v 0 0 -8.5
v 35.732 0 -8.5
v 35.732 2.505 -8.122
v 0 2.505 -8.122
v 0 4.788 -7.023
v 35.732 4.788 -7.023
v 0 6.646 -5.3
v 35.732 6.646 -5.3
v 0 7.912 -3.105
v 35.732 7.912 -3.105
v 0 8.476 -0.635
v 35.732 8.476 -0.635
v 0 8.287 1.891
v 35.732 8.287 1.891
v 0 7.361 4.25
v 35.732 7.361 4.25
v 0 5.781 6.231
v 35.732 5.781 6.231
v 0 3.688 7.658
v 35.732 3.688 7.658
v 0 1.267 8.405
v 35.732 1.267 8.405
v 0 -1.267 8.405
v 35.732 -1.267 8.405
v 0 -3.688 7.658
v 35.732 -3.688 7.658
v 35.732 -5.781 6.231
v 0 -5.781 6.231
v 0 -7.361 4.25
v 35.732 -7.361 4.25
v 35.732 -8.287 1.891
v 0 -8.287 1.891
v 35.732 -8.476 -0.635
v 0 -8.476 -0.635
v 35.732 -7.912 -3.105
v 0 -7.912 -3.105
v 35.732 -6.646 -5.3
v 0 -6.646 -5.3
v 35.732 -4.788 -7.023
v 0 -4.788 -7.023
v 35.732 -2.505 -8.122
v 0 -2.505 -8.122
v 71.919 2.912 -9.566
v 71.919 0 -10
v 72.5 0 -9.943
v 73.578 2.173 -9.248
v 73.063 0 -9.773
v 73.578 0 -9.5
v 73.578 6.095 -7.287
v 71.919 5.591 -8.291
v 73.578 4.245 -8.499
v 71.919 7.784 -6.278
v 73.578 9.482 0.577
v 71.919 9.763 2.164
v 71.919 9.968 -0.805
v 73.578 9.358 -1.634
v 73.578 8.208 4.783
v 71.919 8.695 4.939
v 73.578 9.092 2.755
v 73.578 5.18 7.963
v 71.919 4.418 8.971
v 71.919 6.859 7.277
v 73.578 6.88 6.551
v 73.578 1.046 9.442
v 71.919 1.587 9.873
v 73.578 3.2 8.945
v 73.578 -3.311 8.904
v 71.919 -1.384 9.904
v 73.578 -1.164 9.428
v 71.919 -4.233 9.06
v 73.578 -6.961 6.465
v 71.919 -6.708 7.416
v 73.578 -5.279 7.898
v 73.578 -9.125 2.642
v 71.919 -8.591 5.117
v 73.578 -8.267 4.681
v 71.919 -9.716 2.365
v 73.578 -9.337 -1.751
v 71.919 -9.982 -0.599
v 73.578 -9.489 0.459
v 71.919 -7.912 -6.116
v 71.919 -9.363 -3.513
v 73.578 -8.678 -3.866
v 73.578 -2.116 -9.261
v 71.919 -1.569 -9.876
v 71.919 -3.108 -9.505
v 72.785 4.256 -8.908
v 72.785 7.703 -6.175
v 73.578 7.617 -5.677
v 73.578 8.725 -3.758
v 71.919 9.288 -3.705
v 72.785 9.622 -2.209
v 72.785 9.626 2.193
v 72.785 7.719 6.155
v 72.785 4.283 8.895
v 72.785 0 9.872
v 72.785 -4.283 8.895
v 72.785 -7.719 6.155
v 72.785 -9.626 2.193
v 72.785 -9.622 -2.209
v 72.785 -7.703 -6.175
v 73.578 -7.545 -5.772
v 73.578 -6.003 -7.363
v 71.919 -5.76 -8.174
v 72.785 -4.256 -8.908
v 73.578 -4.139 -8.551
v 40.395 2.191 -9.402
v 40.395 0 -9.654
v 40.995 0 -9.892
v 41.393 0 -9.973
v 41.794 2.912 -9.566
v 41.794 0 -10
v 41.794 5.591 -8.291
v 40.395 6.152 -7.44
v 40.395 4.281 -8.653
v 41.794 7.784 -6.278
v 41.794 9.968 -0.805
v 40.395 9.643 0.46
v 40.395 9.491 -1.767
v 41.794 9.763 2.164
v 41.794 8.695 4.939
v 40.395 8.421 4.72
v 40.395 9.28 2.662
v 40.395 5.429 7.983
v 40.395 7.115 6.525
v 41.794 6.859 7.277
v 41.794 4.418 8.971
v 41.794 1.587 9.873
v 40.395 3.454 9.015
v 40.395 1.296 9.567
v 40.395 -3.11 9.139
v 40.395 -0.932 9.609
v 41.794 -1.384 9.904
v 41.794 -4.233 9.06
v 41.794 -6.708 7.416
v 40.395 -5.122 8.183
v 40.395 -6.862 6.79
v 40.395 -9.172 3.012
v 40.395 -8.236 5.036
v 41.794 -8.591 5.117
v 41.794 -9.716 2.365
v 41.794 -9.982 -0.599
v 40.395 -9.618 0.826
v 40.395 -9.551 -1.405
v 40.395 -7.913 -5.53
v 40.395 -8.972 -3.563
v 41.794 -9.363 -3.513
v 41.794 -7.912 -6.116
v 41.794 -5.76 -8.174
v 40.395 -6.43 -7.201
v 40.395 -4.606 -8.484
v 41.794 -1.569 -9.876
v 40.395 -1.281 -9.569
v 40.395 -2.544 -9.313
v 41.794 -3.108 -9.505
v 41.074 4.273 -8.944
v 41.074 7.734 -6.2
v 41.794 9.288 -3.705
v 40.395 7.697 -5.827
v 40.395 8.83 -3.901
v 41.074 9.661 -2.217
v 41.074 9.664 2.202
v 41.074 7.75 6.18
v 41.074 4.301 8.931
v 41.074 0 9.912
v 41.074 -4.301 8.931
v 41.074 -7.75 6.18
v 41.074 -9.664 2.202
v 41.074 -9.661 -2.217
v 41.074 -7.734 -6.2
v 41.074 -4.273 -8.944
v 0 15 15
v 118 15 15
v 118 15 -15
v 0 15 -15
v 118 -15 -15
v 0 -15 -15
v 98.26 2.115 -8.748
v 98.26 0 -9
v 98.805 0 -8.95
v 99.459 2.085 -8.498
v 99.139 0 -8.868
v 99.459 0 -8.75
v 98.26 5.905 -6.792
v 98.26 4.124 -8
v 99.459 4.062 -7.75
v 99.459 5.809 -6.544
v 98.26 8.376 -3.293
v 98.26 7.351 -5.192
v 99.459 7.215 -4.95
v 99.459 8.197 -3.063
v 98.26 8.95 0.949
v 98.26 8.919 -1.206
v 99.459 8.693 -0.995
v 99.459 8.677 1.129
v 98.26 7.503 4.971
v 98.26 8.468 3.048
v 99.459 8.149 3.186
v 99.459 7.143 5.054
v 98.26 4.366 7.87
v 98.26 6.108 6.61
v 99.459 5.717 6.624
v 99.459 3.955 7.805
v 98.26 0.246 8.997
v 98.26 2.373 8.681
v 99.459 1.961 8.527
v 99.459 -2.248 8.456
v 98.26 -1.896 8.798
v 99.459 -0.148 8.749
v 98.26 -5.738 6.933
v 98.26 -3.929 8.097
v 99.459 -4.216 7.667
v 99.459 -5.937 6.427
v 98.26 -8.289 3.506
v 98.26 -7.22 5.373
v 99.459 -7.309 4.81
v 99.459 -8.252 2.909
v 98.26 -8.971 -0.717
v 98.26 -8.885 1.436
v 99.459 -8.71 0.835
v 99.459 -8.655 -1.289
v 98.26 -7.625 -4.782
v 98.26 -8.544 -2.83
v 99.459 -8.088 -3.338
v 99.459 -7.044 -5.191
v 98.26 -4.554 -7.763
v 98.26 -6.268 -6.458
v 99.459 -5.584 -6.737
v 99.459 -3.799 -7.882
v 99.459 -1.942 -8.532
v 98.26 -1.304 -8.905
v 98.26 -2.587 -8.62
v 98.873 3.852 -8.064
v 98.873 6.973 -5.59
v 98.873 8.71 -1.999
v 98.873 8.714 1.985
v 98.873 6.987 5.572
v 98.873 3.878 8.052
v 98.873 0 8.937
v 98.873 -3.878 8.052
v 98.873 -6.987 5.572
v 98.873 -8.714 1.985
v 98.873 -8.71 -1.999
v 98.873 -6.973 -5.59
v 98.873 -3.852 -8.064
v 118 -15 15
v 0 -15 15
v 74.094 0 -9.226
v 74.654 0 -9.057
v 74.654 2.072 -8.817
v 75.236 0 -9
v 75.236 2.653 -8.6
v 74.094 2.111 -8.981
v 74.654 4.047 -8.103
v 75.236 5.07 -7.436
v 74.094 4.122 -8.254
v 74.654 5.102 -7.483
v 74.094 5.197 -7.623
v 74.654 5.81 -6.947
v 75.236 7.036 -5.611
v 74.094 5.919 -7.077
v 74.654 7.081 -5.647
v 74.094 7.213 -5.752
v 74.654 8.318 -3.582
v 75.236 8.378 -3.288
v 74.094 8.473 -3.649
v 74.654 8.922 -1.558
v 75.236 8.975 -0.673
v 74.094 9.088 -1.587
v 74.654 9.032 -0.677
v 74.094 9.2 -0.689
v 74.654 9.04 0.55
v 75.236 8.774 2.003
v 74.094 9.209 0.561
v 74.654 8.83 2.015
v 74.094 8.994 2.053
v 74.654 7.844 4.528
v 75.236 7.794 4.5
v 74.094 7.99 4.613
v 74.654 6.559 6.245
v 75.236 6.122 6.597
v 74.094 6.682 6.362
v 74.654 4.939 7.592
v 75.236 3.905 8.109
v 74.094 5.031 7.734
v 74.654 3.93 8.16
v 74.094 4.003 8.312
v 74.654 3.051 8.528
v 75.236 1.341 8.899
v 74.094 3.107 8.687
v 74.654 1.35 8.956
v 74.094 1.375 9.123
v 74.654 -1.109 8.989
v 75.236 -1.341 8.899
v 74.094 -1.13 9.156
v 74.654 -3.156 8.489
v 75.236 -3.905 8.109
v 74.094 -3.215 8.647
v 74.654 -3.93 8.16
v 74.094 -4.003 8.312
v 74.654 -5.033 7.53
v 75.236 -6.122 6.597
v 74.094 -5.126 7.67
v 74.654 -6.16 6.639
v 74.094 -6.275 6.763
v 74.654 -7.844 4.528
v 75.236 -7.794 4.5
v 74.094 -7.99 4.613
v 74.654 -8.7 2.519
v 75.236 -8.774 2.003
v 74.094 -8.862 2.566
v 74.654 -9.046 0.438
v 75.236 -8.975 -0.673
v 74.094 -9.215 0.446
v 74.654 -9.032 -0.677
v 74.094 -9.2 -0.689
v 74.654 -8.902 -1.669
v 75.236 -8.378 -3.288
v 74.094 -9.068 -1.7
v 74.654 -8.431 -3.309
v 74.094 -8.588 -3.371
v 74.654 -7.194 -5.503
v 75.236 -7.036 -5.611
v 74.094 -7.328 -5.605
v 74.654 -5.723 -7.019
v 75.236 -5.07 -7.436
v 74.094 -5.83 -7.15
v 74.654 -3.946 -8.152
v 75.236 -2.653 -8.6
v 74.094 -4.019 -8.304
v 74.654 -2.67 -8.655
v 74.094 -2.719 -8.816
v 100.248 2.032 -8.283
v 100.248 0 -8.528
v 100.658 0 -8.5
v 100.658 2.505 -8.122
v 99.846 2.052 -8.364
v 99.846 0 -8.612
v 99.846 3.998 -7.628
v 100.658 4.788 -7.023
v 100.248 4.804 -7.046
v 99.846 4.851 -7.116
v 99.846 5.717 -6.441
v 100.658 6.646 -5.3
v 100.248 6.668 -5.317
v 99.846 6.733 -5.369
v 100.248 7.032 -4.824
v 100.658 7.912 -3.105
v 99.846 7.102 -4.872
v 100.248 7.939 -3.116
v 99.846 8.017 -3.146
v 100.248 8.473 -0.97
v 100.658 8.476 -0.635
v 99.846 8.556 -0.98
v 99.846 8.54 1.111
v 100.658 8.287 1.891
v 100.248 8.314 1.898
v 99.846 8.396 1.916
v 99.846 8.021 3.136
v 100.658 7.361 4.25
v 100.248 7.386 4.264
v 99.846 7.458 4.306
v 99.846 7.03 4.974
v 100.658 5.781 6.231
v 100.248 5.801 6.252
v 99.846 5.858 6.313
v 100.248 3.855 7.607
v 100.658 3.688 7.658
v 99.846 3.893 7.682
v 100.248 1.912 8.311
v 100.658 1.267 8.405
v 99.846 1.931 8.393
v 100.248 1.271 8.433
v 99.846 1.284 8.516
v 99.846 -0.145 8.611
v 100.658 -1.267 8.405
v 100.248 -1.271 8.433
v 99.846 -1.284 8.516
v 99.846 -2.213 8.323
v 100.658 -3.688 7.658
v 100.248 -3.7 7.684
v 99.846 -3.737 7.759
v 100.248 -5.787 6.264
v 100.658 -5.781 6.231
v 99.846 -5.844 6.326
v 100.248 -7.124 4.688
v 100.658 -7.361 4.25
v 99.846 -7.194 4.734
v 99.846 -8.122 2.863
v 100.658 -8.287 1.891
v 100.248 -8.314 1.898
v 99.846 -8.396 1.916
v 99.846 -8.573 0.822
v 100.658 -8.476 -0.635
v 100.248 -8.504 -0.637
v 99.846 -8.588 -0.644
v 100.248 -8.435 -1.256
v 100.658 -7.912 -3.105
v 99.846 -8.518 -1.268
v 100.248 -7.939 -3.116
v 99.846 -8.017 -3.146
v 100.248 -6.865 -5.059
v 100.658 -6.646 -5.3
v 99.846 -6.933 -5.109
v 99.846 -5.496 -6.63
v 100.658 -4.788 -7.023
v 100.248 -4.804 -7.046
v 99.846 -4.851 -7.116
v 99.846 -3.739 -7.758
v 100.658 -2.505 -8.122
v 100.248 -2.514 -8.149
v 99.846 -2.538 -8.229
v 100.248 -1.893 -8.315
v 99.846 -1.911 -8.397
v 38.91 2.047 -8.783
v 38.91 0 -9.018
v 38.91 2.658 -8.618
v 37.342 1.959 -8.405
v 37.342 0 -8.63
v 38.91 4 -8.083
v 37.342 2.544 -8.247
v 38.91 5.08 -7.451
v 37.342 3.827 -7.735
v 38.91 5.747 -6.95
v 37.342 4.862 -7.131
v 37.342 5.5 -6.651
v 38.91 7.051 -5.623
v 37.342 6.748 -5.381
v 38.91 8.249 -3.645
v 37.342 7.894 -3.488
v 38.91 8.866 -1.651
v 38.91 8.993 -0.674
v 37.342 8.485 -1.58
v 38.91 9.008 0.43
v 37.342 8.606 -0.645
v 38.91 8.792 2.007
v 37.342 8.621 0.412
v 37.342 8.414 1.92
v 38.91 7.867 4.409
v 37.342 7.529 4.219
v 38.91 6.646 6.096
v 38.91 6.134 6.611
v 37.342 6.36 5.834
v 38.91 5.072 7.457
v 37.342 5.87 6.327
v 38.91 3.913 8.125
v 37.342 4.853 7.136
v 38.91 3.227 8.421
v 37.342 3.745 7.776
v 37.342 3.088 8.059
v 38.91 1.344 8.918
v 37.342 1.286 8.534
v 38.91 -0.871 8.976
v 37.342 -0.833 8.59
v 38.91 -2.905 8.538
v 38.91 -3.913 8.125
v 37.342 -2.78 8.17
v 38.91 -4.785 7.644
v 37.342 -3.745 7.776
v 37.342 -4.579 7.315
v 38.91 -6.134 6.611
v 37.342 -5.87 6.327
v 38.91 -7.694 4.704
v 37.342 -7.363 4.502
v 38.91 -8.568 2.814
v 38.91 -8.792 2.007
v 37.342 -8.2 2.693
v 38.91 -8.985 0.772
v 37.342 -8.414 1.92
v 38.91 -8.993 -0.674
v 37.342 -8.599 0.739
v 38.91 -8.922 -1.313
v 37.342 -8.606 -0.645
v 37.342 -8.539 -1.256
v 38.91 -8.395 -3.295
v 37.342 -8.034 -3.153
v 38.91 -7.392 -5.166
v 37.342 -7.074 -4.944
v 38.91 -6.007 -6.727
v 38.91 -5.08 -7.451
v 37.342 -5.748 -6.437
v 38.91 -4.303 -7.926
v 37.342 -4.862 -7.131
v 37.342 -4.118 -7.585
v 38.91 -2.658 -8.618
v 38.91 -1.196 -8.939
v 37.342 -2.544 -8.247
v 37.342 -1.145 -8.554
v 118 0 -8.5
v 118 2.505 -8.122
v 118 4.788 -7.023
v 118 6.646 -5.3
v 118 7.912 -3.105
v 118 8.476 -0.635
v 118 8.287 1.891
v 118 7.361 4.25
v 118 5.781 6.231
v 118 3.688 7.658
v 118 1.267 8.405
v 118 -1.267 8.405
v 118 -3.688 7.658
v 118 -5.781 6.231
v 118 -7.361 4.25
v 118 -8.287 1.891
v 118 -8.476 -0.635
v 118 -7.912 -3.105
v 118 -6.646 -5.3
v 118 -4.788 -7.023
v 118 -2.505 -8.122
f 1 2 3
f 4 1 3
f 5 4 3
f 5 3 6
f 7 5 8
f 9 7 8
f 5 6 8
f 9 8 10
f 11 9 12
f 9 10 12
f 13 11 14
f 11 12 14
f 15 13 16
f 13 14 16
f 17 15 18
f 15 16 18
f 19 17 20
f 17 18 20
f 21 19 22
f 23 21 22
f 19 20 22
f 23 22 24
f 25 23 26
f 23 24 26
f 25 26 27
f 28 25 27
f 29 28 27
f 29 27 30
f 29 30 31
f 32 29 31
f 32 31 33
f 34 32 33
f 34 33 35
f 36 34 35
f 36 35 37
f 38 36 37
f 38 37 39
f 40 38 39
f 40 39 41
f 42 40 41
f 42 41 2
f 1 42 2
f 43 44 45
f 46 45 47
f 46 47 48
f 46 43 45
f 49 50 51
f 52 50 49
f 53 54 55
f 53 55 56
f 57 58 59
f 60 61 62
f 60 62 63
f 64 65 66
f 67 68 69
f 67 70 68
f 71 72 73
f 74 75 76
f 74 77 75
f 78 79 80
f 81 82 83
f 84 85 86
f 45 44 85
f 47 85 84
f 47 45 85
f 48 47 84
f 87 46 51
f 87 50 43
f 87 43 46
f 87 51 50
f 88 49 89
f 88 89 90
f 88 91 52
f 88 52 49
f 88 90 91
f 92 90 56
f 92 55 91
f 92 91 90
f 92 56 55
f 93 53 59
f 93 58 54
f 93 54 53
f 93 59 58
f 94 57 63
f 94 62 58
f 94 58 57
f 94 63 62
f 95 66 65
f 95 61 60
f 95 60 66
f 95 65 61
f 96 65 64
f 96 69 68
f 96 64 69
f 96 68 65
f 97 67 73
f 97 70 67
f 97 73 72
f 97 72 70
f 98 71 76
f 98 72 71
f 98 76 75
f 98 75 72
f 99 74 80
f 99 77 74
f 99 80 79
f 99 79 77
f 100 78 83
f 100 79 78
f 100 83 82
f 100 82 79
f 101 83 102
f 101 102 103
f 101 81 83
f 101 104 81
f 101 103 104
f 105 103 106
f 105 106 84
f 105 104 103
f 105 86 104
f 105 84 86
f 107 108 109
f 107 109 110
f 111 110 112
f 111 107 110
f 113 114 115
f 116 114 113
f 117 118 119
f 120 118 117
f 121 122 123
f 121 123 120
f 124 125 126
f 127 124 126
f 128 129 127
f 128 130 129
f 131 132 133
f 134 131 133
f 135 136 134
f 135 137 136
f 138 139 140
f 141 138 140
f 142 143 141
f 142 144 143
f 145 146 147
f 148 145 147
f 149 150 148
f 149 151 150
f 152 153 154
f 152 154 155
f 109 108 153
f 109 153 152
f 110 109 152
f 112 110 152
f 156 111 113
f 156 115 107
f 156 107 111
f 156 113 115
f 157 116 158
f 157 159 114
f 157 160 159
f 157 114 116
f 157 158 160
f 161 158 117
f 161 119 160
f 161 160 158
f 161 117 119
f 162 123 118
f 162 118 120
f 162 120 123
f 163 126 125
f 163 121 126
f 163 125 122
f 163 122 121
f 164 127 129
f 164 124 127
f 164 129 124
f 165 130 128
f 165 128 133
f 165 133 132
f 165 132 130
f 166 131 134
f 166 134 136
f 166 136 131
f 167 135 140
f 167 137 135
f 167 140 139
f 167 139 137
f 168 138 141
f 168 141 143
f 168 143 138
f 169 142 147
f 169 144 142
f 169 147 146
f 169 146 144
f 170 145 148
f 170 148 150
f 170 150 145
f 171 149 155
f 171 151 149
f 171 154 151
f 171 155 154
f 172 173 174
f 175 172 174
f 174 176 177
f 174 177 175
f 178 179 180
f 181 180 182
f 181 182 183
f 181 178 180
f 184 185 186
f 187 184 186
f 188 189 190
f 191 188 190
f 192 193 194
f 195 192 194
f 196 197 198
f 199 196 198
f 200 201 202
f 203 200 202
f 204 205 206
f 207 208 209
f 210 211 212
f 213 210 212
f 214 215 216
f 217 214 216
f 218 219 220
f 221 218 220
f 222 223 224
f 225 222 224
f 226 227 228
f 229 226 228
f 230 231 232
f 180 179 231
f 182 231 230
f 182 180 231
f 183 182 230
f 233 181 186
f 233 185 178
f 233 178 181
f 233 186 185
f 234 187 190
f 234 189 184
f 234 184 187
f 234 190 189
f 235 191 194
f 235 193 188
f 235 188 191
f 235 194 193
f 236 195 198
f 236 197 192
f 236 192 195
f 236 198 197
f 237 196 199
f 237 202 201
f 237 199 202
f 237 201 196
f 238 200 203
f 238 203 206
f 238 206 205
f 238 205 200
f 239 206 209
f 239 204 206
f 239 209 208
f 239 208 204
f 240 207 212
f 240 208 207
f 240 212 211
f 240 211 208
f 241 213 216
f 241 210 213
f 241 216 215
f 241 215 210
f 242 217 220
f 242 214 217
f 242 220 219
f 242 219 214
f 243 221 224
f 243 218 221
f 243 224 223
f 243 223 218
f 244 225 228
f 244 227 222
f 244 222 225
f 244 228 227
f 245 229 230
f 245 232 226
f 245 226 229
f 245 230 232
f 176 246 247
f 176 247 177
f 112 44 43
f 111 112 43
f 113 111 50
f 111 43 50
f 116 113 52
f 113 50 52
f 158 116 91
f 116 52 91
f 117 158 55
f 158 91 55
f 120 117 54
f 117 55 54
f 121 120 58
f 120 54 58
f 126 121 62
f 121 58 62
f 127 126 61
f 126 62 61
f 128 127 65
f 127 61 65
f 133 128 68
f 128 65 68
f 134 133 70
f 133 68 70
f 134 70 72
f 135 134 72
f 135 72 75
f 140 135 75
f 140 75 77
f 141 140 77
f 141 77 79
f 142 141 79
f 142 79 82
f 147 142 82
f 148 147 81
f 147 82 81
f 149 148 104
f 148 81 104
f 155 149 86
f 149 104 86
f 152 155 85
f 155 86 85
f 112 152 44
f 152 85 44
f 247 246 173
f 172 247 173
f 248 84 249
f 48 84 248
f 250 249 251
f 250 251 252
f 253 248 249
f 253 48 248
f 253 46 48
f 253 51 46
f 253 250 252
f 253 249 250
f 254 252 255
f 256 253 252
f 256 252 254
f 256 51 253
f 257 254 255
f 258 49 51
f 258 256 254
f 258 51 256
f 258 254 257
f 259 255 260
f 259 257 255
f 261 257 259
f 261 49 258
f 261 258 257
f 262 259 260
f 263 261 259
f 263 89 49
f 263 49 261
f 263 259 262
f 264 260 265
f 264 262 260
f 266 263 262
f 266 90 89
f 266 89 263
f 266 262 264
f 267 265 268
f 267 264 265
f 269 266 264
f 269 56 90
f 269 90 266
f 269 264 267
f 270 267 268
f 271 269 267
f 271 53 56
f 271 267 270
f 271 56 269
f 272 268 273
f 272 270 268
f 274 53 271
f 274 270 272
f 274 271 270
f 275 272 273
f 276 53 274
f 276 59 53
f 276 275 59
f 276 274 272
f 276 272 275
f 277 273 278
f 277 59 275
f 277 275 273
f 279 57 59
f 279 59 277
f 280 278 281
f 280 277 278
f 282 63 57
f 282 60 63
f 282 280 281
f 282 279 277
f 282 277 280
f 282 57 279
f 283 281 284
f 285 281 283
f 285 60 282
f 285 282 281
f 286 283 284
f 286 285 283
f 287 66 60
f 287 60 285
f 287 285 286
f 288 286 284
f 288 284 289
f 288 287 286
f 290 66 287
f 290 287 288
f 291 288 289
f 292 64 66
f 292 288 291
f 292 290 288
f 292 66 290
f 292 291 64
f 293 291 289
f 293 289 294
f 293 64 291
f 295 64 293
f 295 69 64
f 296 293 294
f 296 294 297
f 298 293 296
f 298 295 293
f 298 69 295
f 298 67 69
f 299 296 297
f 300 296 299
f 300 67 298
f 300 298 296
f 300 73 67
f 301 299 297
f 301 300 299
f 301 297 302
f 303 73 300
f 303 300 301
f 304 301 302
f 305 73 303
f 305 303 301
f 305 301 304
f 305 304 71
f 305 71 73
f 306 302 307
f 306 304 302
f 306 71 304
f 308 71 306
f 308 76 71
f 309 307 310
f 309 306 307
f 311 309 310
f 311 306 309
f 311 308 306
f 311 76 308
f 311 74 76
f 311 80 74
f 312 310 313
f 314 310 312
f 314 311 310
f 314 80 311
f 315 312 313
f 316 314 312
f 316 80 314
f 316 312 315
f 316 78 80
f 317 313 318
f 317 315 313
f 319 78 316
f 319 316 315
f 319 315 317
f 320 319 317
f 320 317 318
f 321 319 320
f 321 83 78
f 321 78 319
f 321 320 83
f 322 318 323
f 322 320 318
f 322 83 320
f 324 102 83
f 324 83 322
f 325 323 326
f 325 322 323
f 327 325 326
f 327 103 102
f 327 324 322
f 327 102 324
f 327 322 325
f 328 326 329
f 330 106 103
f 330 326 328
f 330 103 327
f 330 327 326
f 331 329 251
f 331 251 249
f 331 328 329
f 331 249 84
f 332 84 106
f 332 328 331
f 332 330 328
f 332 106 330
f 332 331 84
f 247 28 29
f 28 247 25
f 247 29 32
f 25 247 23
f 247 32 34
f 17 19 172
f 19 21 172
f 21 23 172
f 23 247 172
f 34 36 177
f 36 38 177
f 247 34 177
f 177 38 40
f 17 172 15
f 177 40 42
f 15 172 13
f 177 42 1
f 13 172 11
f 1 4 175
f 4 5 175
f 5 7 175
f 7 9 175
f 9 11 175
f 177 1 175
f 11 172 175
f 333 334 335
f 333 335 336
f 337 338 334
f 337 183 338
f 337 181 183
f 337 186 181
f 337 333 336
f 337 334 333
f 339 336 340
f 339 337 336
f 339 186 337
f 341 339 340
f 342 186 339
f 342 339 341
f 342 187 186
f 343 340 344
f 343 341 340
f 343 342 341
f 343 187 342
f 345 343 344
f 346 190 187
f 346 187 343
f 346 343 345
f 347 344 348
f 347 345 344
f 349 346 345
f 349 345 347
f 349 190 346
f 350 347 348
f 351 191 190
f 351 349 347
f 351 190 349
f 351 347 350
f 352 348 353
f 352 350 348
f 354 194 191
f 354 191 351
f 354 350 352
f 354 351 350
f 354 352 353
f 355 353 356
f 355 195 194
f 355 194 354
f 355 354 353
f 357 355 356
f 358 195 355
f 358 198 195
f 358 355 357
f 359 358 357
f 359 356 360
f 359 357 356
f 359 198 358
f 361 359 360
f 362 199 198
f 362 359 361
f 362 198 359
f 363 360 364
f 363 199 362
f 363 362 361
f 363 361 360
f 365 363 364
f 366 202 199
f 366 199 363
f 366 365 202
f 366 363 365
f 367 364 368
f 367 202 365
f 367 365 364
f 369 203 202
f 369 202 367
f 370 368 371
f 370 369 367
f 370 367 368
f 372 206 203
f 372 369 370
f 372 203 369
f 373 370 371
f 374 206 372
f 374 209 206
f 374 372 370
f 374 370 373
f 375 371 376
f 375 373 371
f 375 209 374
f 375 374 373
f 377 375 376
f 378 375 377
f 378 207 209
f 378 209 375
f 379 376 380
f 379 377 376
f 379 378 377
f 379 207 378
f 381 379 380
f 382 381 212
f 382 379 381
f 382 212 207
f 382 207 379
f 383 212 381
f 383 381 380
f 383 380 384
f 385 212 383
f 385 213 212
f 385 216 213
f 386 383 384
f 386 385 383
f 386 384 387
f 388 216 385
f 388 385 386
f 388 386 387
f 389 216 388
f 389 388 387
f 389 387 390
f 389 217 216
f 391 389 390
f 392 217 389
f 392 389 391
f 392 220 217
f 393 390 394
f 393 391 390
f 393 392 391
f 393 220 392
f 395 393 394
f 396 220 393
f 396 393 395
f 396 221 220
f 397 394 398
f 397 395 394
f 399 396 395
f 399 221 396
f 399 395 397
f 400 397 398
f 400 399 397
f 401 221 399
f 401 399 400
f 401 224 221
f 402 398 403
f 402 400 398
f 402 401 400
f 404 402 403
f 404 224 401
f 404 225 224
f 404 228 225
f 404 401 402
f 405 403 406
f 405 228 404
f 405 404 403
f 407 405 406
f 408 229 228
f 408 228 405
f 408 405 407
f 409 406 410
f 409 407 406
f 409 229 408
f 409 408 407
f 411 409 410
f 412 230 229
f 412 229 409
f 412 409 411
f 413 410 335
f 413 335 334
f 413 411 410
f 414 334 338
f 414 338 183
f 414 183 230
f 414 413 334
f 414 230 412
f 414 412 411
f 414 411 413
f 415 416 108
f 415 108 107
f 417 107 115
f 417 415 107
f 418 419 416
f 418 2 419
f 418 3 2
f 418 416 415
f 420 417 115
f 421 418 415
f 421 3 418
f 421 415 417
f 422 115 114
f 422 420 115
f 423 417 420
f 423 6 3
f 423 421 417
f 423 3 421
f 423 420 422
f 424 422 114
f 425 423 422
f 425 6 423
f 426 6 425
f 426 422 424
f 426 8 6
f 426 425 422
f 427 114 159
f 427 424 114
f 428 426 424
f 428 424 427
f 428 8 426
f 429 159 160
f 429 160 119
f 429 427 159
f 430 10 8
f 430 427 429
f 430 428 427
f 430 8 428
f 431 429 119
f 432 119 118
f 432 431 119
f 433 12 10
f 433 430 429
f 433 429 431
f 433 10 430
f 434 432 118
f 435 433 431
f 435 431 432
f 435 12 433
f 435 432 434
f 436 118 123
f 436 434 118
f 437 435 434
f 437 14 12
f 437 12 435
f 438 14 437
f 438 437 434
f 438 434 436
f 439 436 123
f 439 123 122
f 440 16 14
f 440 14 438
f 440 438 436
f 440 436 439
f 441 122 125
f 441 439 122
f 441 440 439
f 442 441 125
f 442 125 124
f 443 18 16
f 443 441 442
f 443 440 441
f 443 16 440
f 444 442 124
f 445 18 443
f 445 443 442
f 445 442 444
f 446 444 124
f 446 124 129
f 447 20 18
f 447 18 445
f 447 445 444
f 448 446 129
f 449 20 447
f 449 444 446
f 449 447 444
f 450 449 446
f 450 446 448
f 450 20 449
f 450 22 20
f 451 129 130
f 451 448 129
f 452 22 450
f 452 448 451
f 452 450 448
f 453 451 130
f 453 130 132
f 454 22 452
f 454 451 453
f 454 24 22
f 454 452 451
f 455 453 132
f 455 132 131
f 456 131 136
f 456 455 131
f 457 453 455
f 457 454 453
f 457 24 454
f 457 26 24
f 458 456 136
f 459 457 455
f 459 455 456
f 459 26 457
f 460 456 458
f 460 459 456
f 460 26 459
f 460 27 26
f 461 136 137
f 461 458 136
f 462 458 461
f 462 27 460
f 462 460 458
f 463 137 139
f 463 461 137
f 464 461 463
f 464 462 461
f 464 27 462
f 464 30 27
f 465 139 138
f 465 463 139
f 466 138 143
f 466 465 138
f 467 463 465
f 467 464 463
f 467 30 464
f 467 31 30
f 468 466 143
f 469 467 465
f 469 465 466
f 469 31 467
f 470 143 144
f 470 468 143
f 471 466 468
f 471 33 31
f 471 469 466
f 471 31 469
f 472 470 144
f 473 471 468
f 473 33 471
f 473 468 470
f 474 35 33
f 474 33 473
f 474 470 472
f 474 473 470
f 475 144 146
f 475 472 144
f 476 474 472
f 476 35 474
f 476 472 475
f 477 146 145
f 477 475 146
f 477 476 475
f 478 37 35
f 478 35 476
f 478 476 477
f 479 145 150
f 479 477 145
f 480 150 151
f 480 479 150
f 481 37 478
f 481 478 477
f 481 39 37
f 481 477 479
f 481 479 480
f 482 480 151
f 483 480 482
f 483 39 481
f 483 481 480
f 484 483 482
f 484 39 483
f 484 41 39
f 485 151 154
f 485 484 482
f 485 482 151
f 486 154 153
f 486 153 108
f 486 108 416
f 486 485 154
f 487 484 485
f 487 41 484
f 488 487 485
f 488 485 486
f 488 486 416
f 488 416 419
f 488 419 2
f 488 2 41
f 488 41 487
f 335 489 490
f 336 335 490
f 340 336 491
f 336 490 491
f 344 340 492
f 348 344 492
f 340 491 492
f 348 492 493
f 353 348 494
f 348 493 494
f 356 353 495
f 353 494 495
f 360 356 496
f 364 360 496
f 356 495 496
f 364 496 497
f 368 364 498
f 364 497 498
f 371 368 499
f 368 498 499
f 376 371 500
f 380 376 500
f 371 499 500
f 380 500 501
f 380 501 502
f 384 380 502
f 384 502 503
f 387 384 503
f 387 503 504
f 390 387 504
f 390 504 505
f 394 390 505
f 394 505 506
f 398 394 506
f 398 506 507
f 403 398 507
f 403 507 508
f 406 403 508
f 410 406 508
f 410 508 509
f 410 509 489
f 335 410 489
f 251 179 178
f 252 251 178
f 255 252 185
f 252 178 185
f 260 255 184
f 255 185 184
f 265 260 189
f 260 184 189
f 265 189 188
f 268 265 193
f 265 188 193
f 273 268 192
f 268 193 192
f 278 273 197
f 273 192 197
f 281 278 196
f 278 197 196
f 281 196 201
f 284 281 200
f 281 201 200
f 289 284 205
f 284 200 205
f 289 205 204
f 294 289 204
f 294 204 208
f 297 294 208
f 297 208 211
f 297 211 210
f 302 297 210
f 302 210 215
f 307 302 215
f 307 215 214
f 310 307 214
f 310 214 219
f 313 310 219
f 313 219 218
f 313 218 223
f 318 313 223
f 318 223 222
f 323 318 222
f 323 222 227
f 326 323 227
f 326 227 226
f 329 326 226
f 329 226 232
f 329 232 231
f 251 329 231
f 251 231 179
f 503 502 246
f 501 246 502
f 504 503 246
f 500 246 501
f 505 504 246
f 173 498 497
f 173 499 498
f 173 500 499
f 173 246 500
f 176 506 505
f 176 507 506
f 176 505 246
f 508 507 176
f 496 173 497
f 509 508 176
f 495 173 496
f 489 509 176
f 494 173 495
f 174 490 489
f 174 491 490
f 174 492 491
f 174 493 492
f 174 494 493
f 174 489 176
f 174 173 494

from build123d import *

# Parameters (mm, degrees)
SKETCH1_W           = 30
SKETCH1_H           = 30
BOSS_EXTRUDE1_DEPTH = 118
SKETCH2_R           = 8.5
CUT_EXTRUDE1_DEPTH  = 19
SKETCH3_R           = 9
CUT_EXTRUDE2_DEPTH  = 26
SKETCH4_R           = 10
CUT_EXTRUDE3_DEPTH  = 32
SKETCH5_R           = 8.5
CUT_EXTRUDE4_DEPTH  = 44
FILLET3_R           = 10
FILLET4_R           = 3
FILLET5_R           = 3
FILLET6_R           = 3
FILLET7_R           = 3
FILLET8_R           = 3


with BuildPart() as part:
    # Sketch1 → Boss-Extrude1 (new body)
    with BuildSketch(Plane(origin=(0, 0, 0), x_dir=(0, 0, -1), z_dir=(1, 0, 0))):
        Rectangle(SKETCH1_W, SKETCH1_H)
    extrude(amount=BOSS_EXTRUDE1_DEPTH)

    # Sketch2 → Cut-Extrude1 (cut)
    with BuildSketch(Plane(origin=(118, 0, 0), x_dir=(0, 0, -1), z_dir=(1, 0, 0))):
        Circle(SKETCH2_R)
    extrude(amount=-CUT_EXTRUDE1_DEPTH, mode=Mode.SUBTRACT)

    # Sketch3 → Cut-Extrude2 (cut)
    with BuildSketch(Plane(origin=(99, 0, 0), x_dir=(0, 0, -1), z_dir=(1, 0, 0))):
        Circle(SKETCH3_R)
    extrude(amount=-CUT_EXTRUDE2_DEPTH, mode=Mode.SUBTRACT)

    # Sketch4 → Cut-Extrude3 (cut)
    with BuildSketch(Plane(origin=(73, 0, 0), x_dir=(0, 0, -1), z_dir=(1, 0, 0))):
        Circle(SKETCH4_R)
    extrude(amount=-CUT_EXTRUDE3_DEPTH, mode=Mode.SUBTRACT)

    # Sketch5 → Cut-Extrude4 (cut)
    with BuildSketch(Plane(origin=(41, 0, 0), x_dir=(0, 0, -1), z_dir=(1, 0, 0))):
        Circle(SKETCH5_R)
    extrude(amount=-CUT_EXTRUDE4_DEPTH, mode=Mode.SUBTRACT)

    # Fillet3
    # the kernel refuses this fillet: 10 mm, written as the material it takes off along each edge
    with BuildSketch(Plane(origin=(41, 0, 0), x_dir=(0, 0, -1), z_dir=(0, -1, 0))) as fillet3_piece_1:
        with BuildLine():
            CenterArc((18.5, -5.267826876), FILLET3_R, 148.211669383, 31.788330617)
            Line((10, 0), (9.83, 0.105356538))
            ThreePointArc((9.83, 0.105356538), (9.25, 0.2), (8.5, 0.2))
            Line((8.5, 0.2), (8.3, 0))
            Line((8.3, 0), (8.3, -5.267826876))
            Line((8.3, -5.267826876), (8.5, -5.267826876))
        make_face()
    revolve(axis=Axis((41, 0, 0), (1, 0, 0)), mode=Mode.SUBTRACT)

    # Fillet4
    fillet4_edges = [part.edges().sort_by_distance(p)[0] for p in [
        (41, 0, 10),
    ]]
    fillet(fillet4_edges, radius=FILLET4_R)

    # Fillet5
    # the kernel refuses this fillet: 3 mm, written as the material it takes off along each edge
    with BuildSketch(Plane(origin=(73, 0, 0), x_dir=(0, 0, -1), z_dir=(0, -1, 0))) as fillet5_piece_1:
        with BuildLine():
            CenterArc((12, 2.236067977), FILLET5_R, 180, 48.189685104)
            Line((9, 2.236067977), (8.94, 2.236067977))
            Line((8.94, 2.236067977), (8.94, 0))
            Line((8.94, 0), (9, -0.06))
            ThreePointArc((9, -0.06), (9.5, -0.06), (9.96, -0.04472136))
            Line((9.96, -0.04472136), (10, 0))
        make_face()
    revolve(axis=Axis((73, 0, 0), (1, 0, 0)), mode=Mode.SUBTRACT)

    # Fillet6
    fillet6_edges = [part.edges().sort_by_distance(p)[0] for p in [
        (73, 0, 10),
    ]]
    fillet(fillet6_edges, radius=FILLET6_R)

    # Fillet7
    # the kernel refuses this fillet: 3 mm, written as the material it takes off along each edge
    with BuildSketch(Plane(origin=(99, 0, 0), x_dir=(0, 0, -1), z_dir=(0, -1, 0))) as fillet7_piece_1:
        with BuildLine():
            CenterArc((11.5, 1.658312395), FILLET7_R, 180, 33.557309762)
            Line((8.5, 1.658312395), (8.44, 1.658312395))
            Line((8.44, 1.658312395), (8.44, 0))
            Line((8.44, 0), (8.5, -0.06))
            ThreePointArc((8.5, -0.06), (8.75, -0.06), (8.95, -0.033166248))
            Line((8.95, -0.033166248), (9, 0))
        make_face()
    revolve(axis=Axis((99, 0, 0), (1, 0, 0)), mode=Mode.SUBTRACT)

    # Fillet8
    fillet8_edges = [part.edges().sort_by_distance(p)[0] for p in [
        (99, 0, 9),
    ]]
    fillet(fillet8_edges, radius=FILLET8_R)


solid = part.part
